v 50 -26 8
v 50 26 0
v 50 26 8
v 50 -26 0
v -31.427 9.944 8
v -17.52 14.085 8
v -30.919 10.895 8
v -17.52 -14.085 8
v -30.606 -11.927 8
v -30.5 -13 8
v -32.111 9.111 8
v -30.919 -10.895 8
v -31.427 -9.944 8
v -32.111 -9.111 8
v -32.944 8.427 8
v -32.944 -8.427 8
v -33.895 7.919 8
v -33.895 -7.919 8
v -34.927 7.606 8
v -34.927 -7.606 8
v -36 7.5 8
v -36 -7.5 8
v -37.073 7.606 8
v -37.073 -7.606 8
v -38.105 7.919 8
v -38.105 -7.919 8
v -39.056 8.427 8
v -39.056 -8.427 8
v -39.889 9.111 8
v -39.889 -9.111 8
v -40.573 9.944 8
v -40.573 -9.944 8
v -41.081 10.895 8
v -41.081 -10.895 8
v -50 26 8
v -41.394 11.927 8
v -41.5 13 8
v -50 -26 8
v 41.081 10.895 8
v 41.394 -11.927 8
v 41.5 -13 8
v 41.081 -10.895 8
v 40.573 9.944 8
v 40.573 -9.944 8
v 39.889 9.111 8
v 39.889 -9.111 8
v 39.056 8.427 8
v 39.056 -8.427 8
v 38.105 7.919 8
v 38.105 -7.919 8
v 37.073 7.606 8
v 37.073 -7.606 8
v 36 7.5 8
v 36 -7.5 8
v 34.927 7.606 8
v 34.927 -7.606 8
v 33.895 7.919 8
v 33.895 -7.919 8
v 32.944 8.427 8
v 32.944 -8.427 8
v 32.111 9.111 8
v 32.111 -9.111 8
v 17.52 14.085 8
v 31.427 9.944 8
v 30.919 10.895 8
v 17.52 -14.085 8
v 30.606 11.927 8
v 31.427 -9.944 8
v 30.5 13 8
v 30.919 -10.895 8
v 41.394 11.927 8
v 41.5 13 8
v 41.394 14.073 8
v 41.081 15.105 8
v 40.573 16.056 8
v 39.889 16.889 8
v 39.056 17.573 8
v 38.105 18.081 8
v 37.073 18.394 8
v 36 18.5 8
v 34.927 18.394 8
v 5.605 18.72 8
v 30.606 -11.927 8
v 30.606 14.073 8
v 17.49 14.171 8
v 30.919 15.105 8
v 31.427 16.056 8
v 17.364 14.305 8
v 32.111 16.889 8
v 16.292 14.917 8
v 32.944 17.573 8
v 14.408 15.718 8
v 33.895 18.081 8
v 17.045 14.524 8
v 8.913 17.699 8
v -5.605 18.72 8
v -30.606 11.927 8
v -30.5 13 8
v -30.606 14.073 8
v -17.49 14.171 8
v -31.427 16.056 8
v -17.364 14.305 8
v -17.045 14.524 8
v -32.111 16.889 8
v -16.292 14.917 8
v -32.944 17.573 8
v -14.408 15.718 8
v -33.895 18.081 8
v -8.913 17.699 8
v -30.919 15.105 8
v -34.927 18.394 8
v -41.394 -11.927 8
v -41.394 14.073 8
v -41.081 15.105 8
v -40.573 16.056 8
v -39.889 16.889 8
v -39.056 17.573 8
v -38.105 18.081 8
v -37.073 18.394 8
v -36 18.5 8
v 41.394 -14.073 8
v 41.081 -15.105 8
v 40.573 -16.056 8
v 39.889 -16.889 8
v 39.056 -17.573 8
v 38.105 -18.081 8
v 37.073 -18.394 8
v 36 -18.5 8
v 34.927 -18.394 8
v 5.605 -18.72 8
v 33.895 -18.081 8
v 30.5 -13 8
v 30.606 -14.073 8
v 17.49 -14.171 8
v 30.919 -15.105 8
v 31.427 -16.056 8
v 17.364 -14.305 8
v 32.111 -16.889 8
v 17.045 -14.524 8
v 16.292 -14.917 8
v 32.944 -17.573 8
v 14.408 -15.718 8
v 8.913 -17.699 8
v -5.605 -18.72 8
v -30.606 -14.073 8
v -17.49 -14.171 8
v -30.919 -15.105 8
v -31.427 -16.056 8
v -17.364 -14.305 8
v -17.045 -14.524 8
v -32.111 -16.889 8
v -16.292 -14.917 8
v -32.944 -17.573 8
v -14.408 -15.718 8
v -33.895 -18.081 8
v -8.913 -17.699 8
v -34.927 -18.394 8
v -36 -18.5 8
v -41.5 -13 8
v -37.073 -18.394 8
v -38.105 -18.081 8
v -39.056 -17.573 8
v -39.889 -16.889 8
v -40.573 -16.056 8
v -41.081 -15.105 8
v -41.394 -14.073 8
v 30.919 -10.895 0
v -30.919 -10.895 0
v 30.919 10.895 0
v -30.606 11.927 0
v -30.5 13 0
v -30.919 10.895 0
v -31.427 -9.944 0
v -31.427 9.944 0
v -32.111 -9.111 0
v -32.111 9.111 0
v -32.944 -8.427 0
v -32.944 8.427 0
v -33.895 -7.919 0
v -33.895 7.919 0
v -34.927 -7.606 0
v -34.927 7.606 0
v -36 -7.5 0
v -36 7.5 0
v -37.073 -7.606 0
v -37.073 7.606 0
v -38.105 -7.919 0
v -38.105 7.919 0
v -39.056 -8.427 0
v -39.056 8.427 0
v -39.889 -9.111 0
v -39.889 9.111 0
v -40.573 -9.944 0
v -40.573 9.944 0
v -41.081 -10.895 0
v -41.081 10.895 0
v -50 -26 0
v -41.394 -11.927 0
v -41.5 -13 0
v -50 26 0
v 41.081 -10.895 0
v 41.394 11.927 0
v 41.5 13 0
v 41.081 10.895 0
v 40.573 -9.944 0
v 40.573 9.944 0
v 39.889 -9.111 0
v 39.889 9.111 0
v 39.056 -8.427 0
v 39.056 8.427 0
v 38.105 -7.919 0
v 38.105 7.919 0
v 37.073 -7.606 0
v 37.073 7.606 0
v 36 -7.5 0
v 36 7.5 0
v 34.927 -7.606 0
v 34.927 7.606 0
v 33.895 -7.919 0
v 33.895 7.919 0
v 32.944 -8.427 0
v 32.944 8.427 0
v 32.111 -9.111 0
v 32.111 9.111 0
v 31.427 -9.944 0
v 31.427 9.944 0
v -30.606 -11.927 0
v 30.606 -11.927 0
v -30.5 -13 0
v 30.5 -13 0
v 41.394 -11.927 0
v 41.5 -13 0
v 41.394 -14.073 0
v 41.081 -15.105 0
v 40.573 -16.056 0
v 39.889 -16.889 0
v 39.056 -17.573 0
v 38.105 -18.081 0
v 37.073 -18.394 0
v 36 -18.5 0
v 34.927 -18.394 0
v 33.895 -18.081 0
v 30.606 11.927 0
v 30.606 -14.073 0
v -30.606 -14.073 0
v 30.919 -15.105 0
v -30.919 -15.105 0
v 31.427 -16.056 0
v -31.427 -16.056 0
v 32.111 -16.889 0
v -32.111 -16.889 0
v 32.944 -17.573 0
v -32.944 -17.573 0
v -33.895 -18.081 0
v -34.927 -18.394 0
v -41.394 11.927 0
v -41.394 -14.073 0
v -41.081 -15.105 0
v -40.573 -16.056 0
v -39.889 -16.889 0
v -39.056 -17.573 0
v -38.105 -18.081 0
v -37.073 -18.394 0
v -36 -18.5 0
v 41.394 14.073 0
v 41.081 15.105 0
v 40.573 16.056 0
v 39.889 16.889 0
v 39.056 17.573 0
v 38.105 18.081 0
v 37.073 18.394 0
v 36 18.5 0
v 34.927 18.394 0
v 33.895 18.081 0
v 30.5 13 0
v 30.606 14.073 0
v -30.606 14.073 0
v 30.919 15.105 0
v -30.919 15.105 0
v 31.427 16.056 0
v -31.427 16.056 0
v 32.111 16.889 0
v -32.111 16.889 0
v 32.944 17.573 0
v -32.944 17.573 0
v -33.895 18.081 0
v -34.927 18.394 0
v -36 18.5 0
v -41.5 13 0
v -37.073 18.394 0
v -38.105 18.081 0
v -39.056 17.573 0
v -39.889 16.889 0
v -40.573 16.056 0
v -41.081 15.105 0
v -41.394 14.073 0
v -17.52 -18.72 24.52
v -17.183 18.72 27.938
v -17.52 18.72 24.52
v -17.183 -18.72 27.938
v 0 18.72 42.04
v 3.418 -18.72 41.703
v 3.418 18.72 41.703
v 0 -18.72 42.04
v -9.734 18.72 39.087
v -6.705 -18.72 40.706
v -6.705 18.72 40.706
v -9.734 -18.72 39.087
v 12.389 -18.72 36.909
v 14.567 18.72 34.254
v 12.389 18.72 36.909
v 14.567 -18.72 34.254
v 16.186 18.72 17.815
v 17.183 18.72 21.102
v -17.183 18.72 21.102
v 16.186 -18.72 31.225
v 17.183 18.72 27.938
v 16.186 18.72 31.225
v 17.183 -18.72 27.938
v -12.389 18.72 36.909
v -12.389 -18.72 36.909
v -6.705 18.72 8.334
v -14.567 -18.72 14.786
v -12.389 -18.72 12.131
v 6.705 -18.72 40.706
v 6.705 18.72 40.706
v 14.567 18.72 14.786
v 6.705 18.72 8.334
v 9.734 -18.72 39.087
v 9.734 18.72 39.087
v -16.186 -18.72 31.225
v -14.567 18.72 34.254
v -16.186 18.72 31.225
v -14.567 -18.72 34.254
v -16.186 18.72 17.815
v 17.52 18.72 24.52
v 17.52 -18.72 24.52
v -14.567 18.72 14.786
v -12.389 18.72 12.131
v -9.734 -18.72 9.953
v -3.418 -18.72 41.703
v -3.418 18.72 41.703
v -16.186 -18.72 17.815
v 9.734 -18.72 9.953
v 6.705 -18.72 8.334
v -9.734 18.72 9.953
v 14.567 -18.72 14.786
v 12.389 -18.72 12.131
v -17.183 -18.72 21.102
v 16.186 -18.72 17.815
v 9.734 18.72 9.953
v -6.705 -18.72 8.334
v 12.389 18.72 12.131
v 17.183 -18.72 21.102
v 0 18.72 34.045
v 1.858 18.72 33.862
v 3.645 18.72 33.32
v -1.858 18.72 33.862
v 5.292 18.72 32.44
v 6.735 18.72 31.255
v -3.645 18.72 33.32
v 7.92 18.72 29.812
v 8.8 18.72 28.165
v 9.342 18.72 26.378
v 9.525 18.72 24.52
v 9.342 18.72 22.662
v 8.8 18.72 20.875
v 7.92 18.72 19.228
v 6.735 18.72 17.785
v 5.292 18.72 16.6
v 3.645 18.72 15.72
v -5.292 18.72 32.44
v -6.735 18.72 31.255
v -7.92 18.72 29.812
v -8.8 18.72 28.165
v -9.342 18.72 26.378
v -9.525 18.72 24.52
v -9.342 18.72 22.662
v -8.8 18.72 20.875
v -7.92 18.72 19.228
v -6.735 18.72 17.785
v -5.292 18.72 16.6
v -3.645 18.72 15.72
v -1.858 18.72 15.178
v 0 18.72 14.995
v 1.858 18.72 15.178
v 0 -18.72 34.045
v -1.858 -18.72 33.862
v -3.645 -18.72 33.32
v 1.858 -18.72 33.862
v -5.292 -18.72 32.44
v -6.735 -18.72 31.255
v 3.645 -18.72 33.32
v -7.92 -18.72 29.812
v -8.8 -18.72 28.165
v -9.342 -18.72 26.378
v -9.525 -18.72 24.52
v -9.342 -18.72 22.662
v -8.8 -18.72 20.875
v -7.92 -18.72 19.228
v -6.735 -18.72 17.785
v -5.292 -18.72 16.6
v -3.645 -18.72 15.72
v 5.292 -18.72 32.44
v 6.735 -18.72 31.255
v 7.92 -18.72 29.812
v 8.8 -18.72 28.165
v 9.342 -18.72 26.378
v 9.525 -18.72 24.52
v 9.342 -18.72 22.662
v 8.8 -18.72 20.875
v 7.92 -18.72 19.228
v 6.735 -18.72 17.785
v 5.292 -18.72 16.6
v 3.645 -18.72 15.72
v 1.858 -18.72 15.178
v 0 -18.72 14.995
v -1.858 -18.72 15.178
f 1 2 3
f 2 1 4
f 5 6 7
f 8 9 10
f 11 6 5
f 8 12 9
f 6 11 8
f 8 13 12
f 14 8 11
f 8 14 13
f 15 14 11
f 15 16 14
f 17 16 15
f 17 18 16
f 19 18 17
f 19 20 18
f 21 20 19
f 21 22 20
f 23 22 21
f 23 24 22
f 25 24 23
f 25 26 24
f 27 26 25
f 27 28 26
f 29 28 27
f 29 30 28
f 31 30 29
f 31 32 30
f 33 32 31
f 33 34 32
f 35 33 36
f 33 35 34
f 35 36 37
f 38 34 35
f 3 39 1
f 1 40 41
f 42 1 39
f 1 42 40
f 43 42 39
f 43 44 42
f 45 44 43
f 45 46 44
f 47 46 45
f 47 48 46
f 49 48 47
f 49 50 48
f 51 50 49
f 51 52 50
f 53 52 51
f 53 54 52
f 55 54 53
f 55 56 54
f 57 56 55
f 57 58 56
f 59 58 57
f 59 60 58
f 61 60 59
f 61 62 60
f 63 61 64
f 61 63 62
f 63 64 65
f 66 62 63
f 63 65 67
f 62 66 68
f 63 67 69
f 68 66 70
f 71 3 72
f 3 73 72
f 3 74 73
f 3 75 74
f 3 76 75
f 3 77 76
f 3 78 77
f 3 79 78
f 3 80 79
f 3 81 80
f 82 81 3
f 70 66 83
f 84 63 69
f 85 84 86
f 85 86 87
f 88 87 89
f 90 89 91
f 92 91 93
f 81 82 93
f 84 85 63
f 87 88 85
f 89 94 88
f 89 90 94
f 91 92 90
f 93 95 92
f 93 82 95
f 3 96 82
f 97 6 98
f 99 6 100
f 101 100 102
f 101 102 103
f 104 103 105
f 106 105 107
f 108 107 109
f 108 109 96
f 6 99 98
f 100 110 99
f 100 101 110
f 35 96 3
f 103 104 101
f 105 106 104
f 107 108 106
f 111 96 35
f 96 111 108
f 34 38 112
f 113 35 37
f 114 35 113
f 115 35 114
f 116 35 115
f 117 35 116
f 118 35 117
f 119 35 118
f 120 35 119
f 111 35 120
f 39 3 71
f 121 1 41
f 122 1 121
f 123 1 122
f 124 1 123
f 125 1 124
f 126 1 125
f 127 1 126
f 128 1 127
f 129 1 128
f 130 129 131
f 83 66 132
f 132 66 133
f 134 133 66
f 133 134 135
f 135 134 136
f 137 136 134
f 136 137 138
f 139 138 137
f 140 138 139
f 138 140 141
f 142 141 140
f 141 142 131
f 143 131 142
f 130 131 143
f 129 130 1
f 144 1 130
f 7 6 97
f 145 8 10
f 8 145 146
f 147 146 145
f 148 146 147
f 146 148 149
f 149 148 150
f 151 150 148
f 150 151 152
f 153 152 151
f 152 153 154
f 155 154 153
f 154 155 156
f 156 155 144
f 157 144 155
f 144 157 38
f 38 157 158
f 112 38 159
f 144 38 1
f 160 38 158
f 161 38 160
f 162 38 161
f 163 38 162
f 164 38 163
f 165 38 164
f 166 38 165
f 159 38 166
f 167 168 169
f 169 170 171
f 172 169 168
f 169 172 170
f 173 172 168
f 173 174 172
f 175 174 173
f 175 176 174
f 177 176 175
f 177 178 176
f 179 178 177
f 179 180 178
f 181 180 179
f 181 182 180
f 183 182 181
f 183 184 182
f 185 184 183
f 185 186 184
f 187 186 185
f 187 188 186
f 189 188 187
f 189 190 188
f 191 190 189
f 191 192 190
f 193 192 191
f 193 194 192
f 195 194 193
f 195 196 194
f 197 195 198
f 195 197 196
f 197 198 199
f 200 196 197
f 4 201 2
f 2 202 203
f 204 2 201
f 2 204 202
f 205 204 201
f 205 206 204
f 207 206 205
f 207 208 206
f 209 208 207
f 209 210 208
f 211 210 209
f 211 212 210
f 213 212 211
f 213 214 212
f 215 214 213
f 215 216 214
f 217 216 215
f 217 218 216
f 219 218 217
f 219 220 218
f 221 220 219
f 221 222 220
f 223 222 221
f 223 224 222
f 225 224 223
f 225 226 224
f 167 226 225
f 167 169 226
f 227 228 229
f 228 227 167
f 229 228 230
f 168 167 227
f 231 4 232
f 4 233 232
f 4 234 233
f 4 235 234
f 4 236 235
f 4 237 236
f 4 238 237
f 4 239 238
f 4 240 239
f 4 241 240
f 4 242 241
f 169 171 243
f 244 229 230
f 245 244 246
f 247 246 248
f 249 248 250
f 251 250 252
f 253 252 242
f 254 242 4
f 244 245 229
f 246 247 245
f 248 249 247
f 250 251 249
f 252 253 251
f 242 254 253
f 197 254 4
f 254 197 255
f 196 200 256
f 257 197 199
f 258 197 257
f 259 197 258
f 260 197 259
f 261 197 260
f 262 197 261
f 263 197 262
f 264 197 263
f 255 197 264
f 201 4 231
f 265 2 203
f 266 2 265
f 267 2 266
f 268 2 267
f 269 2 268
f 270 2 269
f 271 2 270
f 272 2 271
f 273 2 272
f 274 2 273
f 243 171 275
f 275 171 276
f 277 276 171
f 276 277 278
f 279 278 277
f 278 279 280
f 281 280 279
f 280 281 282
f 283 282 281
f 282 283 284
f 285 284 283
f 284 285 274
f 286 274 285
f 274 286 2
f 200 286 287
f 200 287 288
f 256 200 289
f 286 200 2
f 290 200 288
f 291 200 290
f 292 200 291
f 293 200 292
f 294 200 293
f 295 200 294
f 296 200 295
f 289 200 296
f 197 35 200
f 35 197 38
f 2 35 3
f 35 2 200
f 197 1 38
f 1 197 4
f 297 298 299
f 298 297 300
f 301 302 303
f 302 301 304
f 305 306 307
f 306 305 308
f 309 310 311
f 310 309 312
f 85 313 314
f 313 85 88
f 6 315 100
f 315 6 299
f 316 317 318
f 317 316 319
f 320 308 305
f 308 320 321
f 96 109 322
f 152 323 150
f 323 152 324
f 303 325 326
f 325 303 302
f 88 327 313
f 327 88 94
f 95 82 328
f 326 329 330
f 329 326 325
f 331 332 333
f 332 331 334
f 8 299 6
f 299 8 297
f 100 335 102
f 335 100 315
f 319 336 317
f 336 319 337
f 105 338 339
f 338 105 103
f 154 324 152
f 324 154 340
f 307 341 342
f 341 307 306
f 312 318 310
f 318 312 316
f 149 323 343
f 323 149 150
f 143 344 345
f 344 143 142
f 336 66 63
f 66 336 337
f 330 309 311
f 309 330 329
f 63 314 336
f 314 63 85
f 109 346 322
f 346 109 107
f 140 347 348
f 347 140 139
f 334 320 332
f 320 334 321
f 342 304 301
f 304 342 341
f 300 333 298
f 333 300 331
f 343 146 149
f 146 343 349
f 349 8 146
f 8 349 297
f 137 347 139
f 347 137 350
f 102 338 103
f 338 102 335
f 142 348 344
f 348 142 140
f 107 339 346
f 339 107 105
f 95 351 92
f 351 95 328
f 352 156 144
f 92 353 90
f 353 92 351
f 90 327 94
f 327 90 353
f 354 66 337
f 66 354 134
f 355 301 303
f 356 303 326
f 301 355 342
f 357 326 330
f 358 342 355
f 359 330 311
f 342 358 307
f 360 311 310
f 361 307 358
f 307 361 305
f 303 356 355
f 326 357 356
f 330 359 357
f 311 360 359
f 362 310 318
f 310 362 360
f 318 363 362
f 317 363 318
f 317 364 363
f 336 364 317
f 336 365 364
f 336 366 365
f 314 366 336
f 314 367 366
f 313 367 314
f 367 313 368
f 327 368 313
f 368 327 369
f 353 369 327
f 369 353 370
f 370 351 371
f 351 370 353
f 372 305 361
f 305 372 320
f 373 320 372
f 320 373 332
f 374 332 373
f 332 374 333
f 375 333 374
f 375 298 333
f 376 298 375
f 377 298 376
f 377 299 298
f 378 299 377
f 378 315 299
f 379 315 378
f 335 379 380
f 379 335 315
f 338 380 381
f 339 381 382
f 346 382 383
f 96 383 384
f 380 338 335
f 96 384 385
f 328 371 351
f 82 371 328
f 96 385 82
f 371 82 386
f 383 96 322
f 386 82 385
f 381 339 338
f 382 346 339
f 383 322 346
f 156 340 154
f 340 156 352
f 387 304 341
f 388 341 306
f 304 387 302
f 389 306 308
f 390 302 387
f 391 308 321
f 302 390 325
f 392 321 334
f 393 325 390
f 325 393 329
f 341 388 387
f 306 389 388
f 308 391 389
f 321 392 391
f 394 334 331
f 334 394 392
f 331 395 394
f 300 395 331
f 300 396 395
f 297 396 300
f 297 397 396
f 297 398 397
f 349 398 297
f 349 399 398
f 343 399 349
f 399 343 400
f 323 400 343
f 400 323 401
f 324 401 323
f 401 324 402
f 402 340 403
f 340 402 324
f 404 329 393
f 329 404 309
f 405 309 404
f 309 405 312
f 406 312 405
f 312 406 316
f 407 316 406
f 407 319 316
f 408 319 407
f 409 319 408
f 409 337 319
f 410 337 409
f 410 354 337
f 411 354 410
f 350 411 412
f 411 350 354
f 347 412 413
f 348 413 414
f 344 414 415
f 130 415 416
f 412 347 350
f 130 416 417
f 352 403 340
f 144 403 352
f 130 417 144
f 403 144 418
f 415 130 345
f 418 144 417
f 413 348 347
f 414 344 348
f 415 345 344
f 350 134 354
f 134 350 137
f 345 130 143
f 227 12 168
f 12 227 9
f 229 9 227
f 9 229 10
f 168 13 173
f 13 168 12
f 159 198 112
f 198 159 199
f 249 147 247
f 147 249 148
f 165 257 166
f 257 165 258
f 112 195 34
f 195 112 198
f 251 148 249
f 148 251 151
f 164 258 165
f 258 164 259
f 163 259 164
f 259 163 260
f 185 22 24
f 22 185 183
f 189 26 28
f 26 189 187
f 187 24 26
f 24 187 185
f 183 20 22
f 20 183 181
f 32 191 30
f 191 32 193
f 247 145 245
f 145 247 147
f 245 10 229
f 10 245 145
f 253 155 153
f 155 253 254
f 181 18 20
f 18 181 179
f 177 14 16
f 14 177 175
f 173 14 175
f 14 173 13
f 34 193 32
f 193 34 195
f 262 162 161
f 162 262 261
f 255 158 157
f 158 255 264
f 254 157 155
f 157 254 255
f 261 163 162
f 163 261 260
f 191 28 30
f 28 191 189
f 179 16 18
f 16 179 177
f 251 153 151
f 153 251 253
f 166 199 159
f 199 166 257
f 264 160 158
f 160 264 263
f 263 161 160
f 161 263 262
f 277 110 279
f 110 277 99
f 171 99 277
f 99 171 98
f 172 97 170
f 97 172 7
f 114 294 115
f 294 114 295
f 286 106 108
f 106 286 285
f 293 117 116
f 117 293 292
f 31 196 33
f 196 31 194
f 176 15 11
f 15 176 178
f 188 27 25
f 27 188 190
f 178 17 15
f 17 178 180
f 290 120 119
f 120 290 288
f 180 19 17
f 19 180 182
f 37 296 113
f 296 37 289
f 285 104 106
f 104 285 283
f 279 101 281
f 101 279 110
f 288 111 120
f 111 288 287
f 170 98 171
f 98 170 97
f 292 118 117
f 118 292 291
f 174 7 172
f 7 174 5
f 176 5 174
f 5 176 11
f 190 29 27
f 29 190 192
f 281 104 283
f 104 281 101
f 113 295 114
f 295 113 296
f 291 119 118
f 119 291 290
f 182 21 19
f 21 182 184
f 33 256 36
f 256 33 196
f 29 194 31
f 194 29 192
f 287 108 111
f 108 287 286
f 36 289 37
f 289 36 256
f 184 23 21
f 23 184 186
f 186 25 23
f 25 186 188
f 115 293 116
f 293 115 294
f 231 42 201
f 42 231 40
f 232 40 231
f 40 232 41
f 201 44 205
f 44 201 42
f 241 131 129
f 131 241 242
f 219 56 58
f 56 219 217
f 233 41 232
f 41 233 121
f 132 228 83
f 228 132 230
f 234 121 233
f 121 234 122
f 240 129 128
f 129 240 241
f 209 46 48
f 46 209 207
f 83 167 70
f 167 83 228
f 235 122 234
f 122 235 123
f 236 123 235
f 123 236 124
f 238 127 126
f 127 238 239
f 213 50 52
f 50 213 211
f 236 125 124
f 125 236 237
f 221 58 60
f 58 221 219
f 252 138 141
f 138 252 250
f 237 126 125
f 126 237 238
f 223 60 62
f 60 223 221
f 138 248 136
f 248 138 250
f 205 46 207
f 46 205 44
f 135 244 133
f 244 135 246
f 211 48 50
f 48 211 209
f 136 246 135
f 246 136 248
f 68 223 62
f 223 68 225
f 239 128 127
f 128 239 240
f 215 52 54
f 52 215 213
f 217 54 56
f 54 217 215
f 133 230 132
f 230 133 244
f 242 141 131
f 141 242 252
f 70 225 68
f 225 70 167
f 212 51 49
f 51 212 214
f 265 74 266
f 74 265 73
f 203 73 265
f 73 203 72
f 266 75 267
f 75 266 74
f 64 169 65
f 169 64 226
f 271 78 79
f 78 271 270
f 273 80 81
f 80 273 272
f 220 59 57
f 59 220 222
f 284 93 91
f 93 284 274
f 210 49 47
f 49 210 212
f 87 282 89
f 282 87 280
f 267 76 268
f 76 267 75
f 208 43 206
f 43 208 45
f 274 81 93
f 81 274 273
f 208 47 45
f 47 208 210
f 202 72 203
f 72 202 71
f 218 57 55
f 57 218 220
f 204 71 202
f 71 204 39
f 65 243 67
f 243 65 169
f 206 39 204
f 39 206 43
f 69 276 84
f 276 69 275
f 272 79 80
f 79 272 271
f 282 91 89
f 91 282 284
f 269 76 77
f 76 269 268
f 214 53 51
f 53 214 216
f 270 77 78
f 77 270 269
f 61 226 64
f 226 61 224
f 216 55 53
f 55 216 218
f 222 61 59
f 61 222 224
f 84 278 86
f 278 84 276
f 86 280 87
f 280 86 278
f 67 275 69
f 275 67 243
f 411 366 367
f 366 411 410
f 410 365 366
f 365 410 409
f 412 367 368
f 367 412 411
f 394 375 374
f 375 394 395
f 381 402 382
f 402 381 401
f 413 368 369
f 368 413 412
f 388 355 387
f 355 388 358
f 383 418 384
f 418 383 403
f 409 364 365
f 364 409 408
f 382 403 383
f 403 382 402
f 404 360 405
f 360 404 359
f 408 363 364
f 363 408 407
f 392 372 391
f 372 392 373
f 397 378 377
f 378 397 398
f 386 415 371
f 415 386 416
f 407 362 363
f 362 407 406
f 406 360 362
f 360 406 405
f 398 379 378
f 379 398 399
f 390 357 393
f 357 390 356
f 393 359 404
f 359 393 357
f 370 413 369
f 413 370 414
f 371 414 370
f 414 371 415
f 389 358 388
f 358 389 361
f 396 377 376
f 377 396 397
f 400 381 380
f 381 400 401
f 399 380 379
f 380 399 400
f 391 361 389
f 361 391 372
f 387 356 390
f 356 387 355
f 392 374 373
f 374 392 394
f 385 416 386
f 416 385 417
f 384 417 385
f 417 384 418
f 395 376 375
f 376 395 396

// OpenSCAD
$fn = 32;

// ----------------------------------------------------------------------
// Bearing block: 100 x 52 mm base, 19.05 mm bore at 24.52 mm
// ----------------------------------------------------------------------

// --- parameters (mm) ---
base_w = 100;             // base width
base_d = 52;              // base depth
base_t = 8;               // base thickness
bore_d = 19.05;           // shaft / bearing bore
house_r = 17.52;          // housing outer radius
house_len = 37.44;        // housing length along the shaft
foot_w = 35.04;           // foot width under the housing
foot_len = 27.44;         // foot length along the shaft
axis_z = 24.52;           // bore axis height above the base
holes_d = 11;             // mounting holes
hole_x = 36;              // mounting hole spacing

difference() {
  union() {
    /* base plate with its underside on z = 0 */
    translate([0, 0, base_t / 2]) cube([base_w, base_d, base_t], center = true);
    /* hull foot: a straight web blending into the round housing */
    hull() {
      translate([0, 0, base_t - 0.5]) cube([foot_w, foot_len, 1.6], center = true);
      translate([0, 0, axis_z]) rotate([-90, 0, 0]) cylinder(h = house_len, d = 2 * house_r, center = true);
    }
  }
  /* bore through the housing, 2.5 mm clear on both sides */
  translate([0, 0, axis_z]) rotate([-90, 0, 0]) cylinder(h = house_len + 5, d = bore_d, center = true);
  /* mounting holes through the base plate */
  for (hx = [-36, 36]) {
    for (hy = [-13, 13]) {
      translate([hx, hy, -2.5]) cylinder(h = base_t + 5, d = holes_d);
    }
  }
}
